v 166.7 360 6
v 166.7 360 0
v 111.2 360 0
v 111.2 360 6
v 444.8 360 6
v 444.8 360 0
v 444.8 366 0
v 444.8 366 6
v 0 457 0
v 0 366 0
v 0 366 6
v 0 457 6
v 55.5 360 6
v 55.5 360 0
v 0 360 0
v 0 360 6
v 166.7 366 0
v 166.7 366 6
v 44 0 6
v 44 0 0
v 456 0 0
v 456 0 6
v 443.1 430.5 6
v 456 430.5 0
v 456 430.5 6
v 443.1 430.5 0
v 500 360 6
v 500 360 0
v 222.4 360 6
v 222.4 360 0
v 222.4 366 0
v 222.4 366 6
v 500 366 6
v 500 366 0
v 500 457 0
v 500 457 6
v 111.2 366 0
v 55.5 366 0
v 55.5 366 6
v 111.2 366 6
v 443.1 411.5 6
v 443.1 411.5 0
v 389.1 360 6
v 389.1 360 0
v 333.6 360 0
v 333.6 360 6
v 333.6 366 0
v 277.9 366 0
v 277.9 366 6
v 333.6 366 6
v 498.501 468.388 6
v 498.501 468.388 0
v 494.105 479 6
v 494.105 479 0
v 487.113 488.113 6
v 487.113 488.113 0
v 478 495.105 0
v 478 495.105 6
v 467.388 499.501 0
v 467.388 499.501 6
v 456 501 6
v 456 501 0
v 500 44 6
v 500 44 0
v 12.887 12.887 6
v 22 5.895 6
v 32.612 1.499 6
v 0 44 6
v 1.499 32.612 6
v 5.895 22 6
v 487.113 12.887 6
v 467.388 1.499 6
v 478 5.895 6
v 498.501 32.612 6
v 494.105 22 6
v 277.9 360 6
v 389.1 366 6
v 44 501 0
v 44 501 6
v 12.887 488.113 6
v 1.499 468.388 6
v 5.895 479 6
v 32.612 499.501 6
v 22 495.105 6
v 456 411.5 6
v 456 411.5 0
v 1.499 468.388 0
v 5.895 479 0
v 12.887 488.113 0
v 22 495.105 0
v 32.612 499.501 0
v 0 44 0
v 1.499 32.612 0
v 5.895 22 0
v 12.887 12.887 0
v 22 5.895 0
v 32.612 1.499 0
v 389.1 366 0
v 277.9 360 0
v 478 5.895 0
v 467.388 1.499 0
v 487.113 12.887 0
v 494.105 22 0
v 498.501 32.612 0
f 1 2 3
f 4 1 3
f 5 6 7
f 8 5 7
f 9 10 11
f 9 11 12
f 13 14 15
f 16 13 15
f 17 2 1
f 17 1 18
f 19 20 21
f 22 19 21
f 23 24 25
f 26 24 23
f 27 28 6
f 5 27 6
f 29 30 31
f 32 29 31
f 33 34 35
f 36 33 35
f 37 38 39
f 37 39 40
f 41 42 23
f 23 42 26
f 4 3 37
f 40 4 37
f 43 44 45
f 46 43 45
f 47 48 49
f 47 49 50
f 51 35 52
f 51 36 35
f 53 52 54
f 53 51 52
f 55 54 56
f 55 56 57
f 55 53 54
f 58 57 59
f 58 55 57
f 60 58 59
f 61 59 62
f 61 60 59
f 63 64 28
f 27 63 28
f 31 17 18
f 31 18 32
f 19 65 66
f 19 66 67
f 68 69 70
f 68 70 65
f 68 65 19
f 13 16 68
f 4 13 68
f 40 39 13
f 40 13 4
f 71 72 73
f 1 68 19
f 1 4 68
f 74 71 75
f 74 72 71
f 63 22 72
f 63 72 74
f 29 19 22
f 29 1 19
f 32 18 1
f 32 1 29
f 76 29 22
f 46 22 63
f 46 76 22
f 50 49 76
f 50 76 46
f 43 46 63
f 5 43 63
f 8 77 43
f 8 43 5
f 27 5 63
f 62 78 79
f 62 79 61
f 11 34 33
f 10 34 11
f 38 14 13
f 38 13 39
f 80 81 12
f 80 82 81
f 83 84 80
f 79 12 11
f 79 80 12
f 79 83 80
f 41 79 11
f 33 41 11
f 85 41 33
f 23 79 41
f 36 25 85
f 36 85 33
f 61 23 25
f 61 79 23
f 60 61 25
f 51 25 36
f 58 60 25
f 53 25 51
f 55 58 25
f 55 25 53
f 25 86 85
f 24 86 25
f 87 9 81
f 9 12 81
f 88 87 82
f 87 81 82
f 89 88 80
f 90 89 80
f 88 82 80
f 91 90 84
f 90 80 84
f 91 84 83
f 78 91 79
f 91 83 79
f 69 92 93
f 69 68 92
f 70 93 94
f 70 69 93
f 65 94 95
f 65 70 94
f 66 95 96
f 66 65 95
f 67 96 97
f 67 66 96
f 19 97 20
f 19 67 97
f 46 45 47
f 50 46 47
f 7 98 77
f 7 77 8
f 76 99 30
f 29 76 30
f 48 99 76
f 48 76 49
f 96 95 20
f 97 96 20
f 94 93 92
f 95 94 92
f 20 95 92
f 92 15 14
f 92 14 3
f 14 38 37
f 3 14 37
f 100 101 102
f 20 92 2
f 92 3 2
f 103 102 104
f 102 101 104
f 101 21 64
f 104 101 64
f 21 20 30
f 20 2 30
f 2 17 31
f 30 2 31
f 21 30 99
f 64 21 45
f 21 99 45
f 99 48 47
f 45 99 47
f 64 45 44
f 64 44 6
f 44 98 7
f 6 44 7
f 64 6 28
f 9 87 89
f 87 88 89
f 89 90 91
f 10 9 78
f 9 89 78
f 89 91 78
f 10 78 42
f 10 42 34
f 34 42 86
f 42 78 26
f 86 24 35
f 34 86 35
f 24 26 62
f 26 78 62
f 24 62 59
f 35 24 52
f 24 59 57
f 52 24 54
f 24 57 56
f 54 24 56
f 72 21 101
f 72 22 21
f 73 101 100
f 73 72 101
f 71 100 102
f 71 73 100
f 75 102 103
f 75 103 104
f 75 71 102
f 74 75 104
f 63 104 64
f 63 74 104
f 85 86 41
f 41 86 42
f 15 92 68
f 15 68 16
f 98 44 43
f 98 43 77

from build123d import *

# Parameters (mm, degrees)
SKETCH1_W              = 500
SKETCH1_H              = 501
BOSS_EXTRUDE1_DEPTH    = 6
FILLET1_R              = 44
SKETCH2_W              = 55.5
SKETCH2_H              = 6
CUT_EXTRUDE1_DEPTH     = 10
LPATTERN1_COUNT        = 5
LPATTERN1_PITCH        = 111.2
SKETCH4_W              = 12.9
SKETCH4_H              = 19
CUT_EXTRUDE3_DEPTH     = 10
SPLIT1_SURFACE_1_BACK  = 708.84
SPLIT1_SURFACE_1_DEPTH = 1417.68
SPLIT1_SURFACE_2_BACK  = 708.84
SPLIT1_SURFACE_2_DEPTH = 1417.68


with BuildPart() as part:
    # Sketch1 → Boss-Extrude1 (new body)
    with BuildSketch(Plane.XY):
        with Locations((250, 250.5)):
            Rectangle(SKETCH1_W, SKETCH1_H)
    extrude(amount=BOSS_EXTRUDE1_DEPTH)

    # Fillet1
    fillet1_edges = [part.edges().sort_by_distance(p)[0] for p in [
        (0, 501, 3),
        (500, 501, 3),
        (500, 0, 3),
        (0, 0, 3),
    ]]
    fillet(fillet1_edges, radius=FILLET1_R)

    # Sketch2 → Cut-Extrude1 (cut)
    with BuildSketch(Plane(origin=(0, 0, 0), x_dir=(-1, 0, 0), z_dir=(0, 0, -1))):
        with Locations((-27.75, 363)):
            Rectangle(SKETCH2_W, SKETCH2_H)
    cut_extrude1 = extrude(amount=-CUT_EXTRUDE1_DEPTH, mode=Mode.SUBTRACT)

    # LPattern1: Cut-Extrude1 ×5
    with Locations(*[(i * LPATTERN1_PITCH, 0, 0) for i in range(1, LPATTERN1_COUNT)]):
        add(cut_extrude1, mode=Mode.SUBTRACT)

    # Sketch4 → Cut-Extrude3 (cut)
    with BuildSketch(Plane(origin=(0, 0, 0), x_dir=(-1, 0, 0), z_dir=(0, 0, -1))):
        with Locations((-449.55, 421)):
            Rectangle(SKETCH4_W, SKETCH4_H)
    extrude(amount=-CUT_EXTRUDE3_DEPTH, mode=Mode.SUBTRACT)


with BuildPart() as body_2:
    # Split1: the piece behind the surface
    add(part.part)
    # Split1 surface: a surface, the sketch's curves swept straight by 1417.68 mm
    with BuildLine(Plane.XY.offset(6).offset(-SPLIT1_SURFACE_1_BACK), mode=Mode.PRIVATE) as split1_surface_1_path:
        Line((0, 366), (500, 366))
    split1_surface_1 = Shell.extrude(split1_surface_1_path.wire(), (0 * SPLIT1_SURFACE_1_DEPTH, 0 * SPLIT1_SURFACE_1_DEPTH, 1 * SPLIT1_SURFACE_1_DEPTH))
    split(bisect_by=split1_surface_1, keep=Keep.BOTTOM)


with BuildPart() as part_1:
    add(part.part)

    # Split1: split by a surface, the side it looks to stays
    # Split1 surface: a surface, the sketch's curves swept straight by 1417.68 mm
    with BuildLine(Plane.XY.offset(6).offset(-SPLIT1_SURFACE_2_BACK), mode=Mode.PRIVATE) as split1_surface_2_path:
        Line((0, 366), (500, 366))
    split1_surface_2 = Shell.extrude(split1_surface_2_path.wire(), (0 * SPLIT1_SURFACE_2_DEPTH, 0 * SPLIT1_SURFACE_2_DEPTH, 1 * SPLIT1_SURFACE_2_DEPTH))
    split(bisect_by=split1_surface_2, keep=Keep.TOP)


solid = Compound([body_2.part, part_1.part])
